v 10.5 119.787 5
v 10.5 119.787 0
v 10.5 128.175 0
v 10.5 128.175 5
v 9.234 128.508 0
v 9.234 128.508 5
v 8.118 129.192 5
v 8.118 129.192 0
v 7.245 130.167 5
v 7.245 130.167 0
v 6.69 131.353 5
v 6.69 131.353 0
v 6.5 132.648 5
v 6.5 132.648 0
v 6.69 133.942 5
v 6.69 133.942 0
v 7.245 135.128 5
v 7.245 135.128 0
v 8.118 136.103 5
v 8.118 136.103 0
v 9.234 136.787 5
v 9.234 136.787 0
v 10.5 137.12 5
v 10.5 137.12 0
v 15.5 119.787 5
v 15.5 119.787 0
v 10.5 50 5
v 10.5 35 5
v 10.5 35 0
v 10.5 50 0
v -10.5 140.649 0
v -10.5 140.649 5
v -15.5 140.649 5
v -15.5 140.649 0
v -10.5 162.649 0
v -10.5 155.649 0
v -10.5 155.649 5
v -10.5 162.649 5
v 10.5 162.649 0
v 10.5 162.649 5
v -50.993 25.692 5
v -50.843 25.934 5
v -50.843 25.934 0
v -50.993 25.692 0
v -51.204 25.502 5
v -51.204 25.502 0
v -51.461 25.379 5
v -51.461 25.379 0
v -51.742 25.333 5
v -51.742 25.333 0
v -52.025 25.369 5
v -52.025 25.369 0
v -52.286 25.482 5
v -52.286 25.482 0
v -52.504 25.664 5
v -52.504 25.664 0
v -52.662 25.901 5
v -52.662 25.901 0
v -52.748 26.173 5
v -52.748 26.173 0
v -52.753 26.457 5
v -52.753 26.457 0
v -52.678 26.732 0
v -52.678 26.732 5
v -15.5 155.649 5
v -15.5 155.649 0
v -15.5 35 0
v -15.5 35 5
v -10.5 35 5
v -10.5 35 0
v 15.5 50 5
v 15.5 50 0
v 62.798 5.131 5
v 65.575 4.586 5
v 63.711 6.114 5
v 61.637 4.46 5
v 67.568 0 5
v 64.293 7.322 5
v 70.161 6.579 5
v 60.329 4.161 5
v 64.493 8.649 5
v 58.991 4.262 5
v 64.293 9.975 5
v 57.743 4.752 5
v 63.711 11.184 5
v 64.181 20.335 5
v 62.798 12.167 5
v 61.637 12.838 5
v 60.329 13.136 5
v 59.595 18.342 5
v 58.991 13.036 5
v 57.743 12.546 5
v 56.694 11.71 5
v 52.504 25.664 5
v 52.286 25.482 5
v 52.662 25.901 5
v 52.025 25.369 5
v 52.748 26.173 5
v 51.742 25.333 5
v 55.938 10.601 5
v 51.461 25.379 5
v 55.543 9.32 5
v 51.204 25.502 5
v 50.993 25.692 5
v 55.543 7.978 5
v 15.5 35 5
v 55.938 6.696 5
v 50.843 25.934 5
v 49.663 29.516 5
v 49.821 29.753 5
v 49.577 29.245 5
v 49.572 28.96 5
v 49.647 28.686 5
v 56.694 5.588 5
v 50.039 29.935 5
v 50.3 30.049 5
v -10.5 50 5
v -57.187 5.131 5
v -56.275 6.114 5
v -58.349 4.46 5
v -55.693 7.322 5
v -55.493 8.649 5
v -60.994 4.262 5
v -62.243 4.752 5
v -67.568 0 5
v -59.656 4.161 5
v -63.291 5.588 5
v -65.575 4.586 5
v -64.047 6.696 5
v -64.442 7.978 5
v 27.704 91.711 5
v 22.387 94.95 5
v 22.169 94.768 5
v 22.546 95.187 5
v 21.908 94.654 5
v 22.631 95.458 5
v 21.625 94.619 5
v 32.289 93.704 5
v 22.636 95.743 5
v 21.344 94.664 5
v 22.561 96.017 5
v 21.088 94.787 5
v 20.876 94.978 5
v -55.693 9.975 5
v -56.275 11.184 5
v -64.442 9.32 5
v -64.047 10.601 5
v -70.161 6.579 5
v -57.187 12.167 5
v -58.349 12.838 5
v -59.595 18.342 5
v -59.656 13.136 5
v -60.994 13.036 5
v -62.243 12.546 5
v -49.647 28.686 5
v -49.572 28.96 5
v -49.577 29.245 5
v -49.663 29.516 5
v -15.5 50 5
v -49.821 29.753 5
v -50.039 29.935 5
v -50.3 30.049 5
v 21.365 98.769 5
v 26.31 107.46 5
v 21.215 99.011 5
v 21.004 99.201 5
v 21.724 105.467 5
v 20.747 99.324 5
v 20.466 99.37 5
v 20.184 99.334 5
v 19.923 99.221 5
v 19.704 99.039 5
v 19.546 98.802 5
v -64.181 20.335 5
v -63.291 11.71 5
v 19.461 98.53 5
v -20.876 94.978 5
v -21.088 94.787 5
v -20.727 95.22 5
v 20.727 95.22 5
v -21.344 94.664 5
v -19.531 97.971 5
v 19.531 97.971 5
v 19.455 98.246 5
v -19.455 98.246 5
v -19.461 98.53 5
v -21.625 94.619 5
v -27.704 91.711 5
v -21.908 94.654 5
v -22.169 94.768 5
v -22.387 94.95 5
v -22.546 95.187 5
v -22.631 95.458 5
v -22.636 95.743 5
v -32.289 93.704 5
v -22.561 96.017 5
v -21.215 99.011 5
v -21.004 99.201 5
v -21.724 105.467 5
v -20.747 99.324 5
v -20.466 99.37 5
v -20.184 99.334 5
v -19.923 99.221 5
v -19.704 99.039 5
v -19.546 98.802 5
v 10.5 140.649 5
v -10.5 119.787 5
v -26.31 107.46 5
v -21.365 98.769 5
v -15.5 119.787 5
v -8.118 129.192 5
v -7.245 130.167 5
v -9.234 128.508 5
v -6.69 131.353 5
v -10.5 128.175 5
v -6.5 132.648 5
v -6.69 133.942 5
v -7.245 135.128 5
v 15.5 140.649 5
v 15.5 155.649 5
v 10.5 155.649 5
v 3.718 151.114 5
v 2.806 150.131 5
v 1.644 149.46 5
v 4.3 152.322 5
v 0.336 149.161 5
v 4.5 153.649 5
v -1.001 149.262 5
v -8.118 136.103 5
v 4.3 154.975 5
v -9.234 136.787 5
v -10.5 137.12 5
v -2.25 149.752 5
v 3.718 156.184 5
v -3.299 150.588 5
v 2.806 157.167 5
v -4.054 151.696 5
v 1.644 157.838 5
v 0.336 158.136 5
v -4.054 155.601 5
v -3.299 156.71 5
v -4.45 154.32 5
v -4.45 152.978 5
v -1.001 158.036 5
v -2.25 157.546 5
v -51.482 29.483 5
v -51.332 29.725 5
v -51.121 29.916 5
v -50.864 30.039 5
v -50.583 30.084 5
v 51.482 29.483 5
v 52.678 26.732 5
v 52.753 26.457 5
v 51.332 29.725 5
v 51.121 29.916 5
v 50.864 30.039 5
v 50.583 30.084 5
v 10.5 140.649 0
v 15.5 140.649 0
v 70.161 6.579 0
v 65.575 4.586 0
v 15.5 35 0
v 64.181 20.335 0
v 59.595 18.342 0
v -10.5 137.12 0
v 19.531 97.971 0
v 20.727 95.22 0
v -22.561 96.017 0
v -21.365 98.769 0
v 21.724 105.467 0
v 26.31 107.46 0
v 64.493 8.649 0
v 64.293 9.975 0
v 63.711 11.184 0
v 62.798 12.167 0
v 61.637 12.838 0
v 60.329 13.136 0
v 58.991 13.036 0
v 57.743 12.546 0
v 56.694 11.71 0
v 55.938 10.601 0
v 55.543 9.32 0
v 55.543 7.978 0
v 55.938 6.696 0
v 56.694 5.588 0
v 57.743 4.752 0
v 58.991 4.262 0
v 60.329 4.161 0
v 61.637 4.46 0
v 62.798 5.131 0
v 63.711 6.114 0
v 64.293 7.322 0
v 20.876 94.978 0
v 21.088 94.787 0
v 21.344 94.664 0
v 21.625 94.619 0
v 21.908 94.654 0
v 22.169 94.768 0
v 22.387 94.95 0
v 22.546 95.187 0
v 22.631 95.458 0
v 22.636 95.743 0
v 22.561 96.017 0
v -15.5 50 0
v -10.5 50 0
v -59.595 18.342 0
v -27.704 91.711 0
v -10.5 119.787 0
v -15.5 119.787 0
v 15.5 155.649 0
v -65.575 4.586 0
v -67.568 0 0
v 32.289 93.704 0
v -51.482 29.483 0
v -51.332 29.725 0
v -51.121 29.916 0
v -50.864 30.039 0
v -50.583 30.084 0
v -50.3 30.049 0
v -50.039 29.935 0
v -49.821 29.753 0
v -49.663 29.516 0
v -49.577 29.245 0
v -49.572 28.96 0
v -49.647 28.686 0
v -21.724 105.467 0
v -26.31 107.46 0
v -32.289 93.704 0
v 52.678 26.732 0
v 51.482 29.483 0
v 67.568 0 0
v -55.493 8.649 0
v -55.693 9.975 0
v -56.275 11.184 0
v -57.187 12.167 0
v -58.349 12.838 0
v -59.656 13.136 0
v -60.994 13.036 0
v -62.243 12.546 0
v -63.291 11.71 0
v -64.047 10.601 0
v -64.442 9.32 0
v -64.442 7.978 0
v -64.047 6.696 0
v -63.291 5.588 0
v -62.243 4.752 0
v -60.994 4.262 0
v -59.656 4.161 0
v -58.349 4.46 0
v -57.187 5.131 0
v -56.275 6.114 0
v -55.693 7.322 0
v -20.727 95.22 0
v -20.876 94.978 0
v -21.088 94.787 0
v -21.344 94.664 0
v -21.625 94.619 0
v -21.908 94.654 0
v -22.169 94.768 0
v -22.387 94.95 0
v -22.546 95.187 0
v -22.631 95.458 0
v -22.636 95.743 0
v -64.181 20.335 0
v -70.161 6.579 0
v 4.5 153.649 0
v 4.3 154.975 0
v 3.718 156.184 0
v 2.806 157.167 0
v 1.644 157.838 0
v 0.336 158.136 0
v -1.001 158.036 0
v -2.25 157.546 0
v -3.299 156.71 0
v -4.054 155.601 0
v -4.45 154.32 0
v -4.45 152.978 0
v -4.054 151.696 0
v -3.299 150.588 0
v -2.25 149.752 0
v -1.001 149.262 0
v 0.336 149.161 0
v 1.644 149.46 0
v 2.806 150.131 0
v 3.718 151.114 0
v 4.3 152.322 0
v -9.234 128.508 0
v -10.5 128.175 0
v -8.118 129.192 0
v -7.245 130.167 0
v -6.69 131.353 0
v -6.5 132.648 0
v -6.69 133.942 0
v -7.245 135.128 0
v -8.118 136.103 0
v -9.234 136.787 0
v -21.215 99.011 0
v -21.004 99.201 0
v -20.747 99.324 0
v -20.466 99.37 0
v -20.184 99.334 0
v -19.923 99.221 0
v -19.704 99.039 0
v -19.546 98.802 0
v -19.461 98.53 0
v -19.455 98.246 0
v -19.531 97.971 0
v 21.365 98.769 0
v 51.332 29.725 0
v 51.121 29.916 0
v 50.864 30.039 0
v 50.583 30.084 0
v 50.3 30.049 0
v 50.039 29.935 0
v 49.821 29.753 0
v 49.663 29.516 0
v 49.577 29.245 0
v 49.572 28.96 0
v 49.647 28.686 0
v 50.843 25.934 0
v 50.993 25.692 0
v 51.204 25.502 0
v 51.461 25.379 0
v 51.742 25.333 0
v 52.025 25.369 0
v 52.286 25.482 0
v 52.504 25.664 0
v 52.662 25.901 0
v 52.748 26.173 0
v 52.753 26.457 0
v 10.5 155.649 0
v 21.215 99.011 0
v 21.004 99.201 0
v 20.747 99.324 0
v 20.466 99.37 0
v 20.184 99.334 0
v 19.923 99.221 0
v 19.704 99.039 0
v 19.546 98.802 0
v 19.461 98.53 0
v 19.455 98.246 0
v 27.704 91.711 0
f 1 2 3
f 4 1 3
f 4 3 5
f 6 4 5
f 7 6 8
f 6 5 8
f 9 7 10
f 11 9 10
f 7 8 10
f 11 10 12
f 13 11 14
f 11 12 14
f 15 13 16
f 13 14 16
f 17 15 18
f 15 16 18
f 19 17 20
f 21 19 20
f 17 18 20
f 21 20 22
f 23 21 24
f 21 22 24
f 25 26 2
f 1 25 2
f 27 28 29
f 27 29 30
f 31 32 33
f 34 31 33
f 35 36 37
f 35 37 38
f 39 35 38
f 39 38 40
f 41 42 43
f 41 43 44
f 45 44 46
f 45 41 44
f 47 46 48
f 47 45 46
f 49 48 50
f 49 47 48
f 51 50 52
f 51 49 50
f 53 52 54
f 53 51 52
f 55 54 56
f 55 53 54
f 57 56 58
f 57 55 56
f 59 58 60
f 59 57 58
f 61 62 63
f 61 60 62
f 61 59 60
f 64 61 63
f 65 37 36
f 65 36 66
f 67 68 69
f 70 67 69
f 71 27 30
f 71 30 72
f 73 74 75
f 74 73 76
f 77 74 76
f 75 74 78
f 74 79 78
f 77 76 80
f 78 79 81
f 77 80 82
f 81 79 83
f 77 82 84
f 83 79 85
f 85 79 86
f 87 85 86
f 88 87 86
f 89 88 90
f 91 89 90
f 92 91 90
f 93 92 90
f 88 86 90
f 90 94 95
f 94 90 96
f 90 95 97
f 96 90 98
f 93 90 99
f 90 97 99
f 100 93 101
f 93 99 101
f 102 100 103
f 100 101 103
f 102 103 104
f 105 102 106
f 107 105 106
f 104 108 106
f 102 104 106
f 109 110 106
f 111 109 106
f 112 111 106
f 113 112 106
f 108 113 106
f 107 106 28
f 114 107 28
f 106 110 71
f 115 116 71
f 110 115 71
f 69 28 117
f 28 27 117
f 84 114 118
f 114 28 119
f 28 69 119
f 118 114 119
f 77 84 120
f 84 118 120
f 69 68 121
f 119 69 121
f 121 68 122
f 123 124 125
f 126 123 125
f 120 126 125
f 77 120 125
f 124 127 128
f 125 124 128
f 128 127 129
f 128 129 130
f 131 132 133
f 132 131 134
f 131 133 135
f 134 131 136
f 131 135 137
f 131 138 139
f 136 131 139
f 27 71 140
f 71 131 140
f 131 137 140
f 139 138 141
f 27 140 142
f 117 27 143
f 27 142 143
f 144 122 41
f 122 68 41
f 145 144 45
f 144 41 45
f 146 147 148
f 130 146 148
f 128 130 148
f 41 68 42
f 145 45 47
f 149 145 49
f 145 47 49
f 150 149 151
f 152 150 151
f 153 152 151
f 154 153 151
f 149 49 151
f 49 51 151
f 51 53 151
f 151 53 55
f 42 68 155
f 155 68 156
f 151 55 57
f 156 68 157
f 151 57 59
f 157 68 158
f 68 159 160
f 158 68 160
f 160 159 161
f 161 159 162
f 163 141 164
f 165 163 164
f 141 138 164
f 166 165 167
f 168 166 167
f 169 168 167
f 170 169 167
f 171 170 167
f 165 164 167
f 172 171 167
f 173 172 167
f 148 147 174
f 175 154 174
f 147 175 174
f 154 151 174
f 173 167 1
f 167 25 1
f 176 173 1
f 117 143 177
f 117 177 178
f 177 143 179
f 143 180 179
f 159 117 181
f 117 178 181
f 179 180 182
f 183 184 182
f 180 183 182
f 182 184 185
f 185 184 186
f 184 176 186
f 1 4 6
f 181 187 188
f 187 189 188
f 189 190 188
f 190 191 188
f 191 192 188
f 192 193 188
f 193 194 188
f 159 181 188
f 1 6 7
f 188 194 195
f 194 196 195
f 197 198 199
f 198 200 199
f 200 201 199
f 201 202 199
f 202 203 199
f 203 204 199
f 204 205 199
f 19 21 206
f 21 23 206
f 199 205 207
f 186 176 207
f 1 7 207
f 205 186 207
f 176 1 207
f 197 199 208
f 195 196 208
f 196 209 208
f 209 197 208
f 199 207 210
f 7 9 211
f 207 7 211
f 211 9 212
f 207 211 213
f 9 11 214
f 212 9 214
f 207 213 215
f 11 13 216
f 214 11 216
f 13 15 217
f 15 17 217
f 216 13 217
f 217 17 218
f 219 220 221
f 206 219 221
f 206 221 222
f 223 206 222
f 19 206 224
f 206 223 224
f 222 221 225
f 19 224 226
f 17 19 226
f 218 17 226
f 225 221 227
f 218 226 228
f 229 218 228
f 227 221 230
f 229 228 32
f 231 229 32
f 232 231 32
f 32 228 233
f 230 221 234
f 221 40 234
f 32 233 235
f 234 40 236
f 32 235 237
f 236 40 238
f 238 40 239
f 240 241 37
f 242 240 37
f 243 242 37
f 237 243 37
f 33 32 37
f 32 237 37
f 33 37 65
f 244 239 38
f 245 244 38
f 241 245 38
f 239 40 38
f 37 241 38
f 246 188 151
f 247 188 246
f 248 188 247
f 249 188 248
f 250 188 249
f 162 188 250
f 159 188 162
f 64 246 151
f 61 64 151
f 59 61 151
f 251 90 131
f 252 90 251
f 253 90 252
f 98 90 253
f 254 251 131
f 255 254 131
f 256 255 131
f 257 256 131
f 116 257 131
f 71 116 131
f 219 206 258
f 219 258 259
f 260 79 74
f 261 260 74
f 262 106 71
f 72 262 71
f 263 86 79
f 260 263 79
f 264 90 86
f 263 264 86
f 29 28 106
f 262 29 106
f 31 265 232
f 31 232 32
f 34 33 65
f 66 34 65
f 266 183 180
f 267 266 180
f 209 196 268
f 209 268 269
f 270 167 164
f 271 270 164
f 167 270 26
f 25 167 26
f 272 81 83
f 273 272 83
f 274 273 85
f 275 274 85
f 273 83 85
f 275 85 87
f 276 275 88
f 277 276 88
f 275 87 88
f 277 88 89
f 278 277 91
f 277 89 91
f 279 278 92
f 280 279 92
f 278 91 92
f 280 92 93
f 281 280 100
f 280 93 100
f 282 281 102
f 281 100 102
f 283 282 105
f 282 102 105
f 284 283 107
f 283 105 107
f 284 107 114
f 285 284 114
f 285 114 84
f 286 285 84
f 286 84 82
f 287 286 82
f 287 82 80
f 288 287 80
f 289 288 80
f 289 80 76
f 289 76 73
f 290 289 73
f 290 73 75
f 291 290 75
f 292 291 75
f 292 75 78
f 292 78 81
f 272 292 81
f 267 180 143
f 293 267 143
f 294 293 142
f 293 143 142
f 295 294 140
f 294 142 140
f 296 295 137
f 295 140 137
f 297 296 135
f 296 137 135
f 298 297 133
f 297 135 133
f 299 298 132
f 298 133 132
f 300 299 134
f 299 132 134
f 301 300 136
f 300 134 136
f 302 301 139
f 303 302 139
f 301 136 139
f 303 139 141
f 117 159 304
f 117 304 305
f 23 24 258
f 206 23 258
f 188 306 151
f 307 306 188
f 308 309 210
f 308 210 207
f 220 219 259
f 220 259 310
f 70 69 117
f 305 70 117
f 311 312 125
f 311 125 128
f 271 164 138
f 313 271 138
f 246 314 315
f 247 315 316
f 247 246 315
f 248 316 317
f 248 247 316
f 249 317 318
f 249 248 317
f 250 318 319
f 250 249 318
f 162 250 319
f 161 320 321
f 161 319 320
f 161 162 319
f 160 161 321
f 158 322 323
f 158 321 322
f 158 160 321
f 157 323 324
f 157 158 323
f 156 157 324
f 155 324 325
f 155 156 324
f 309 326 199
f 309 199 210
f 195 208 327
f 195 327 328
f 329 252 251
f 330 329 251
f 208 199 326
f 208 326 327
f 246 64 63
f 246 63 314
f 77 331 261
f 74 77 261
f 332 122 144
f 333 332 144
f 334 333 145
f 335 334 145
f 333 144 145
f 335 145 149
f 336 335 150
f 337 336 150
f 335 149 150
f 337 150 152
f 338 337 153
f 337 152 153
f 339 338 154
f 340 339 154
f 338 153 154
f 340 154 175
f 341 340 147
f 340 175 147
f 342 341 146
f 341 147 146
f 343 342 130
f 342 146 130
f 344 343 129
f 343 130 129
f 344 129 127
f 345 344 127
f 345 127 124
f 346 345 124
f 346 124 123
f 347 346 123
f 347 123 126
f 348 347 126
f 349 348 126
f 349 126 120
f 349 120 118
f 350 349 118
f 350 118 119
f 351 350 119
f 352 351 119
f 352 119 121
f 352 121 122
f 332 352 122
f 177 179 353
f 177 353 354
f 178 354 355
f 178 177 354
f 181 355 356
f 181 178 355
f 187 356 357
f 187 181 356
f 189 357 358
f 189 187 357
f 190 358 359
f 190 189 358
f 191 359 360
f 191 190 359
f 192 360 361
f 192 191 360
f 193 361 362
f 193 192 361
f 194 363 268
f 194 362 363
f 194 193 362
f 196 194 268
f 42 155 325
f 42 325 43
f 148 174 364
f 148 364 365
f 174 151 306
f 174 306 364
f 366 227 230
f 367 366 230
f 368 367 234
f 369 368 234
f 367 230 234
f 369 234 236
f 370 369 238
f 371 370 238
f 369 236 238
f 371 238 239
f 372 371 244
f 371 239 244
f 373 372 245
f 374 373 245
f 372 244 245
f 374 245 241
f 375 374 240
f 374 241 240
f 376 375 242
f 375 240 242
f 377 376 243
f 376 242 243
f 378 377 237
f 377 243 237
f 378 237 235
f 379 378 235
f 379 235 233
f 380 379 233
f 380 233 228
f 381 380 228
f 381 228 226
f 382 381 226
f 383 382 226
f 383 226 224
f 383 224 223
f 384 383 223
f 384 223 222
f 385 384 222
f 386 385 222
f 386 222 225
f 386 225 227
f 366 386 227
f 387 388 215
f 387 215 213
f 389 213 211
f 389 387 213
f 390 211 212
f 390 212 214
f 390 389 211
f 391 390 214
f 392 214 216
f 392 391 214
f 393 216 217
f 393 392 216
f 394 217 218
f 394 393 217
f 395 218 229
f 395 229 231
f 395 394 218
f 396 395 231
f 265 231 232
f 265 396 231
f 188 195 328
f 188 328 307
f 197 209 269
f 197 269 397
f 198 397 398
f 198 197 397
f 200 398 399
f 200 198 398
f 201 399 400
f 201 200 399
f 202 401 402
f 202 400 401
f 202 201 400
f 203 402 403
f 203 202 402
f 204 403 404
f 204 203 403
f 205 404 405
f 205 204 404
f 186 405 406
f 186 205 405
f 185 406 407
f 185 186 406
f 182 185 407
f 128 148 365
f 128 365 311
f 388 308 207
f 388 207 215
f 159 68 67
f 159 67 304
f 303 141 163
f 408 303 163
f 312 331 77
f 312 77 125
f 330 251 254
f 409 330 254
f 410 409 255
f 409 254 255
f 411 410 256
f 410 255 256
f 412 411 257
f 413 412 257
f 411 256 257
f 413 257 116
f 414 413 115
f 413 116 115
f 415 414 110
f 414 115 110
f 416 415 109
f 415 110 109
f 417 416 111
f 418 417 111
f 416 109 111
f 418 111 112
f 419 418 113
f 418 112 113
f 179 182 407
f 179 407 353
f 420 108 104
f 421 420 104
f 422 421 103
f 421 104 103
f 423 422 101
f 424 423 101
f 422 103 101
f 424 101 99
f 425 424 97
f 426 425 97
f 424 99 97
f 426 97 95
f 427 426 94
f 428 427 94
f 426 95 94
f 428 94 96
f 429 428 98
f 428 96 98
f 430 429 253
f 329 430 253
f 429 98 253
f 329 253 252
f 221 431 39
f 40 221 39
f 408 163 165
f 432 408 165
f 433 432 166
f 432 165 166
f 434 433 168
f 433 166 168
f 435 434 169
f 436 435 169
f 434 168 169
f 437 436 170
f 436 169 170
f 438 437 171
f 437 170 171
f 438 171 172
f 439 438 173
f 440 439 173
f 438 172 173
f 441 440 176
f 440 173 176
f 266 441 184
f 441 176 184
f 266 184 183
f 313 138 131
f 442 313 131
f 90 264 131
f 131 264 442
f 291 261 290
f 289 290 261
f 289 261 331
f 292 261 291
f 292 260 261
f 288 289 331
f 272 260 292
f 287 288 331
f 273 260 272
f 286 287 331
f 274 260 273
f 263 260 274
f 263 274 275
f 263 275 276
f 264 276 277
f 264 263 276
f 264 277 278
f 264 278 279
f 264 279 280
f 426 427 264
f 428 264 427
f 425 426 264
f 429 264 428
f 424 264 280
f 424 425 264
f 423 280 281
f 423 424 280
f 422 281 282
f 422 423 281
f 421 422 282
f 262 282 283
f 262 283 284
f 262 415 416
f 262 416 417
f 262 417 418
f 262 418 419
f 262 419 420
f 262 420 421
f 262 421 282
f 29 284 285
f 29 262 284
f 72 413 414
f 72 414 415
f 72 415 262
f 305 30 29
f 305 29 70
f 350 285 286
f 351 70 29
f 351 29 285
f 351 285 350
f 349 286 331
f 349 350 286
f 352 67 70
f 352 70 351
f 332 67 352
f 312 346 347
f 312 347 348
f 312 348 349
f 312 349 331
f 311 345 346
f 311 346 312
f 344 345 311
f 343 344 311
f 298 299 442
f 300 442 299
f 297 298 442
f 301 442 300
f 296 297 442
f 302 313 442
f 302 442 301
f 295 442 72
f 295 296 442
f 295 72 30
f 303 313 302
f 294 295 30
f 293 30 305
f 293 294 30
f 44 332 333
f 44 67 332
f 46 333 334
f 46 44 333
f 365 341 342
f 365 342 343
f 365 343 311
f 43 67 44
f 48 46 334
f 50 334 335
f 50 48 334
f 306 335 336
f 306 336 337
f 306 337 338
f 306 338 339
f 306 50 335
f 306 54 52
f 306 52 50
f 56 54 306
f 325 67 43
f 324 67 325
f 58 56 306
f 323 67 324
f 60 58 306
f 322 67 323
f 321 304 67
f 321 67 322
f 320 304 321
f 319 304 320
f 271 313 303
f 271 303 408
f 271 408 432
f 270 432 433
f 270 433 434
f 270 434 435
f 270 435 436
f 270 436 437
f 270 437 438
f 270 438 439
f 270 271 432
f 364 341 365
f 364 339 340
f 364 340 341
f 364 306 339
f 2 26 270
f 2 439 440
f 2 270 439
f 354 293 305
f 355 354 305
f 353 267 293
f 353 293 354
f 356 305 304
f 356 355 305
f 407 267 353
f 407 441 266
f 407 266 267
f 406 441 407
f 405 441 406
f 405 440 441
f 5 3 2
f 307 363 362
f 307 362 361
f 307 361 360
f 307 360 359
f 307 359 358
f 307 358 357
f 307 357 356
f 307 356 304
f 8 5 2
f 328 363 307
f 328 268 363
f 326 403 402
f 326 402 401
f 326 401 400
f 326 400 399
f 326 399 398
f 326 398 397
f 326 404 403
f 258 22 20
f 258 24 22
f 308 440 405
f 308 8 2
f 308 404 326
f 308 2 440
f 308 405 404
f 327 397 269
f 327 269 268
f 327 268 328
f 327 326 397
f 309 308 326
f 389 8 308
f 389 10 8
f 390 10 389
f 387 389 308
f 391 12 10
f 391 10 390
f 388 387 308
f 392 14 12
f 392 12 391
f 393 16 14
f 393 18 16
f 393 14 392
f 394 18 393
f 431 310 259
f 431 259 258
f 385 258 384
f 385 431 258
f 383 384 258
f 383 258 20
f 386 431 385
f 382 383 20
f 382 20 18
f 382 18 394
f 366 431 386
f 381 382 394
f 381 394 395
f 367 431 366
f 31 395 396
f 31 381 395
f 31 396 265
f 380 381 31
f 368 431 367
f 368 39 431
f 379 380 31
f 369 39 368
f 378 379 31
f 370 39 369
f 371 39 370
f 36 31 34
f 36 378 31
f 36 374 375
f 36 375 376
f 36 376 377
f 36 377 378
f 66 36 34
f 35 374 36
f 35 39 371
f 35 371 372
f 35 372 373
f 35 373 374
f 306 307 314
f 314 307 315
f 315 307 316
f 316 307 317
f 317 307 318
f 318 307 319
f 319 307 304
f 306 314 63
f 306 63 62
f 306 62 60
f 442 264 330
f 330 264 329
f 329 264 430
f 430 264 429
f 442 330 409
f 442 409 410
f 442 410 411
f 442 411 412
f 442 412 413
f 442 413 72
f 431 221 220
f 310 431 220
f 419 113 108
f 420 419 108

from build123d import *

# Parameters (mm, degrees)
BOSS_EXTRUDE1_DEPTH = 5
SKETCH3_W           = 5
SKETCH3_H           = 15
BOSS_EXTRUDE2_DEPTH = 5
SKETCH4_R           = 4.5
CUT_EXTRUDE1_DEPTH  = 178.20653008
SKETCH5_W           = 5
SKETCH5_H           = 15
CUT_EXTRUDE2_DEPTH  = 178.20653008
CUT_EXTRUDE3_DEPTH  = 178.20653008


with BuildPart() as part:
    # Sketch1 → Boss-Extrude1 (new body)
    with BuildSketch(Plane.XY):
        with BuildLine():
            Line((0, 0), (67.568382456, 0))
            Line((67.568382456, 0), (15.5, 119.786515986))
            Line((15.5, 119.786515986), (10.5, 119.786515986))
            Line((10.5, 119.786515986), (10.5, 128.17540896))
            ThreePointArc((10.5, 128.17540896), (6.5, 132.647544915), (10.5, 137.11968087))
            Line((10.5, 137.11968087), (10.5, 162.648799484))
            Line((10.5, 162.648799484), (0, 162.648799484))
            Line((0, 162.648799484), (0, 0))
        make_face()
    boss_extrude1 = extrude(amount=BOSS_EXTRUDE1_DEPTH)

    # Sketch3 → Boss-Extrude2 (add)
    with BuildSketch(Plane.XY.offset(5)):
        Polygon((65.57516115, 4.585528195), (59.595497232, 18.34211278), (64.181025427, 20.335334085), (70.160689345, 6.578749501), align=None)
        Polygon((27.703956339, 91.710563898), (21.724292422, 105.467148482), (26.309820617, 107.460369788), (32.289484534, 93.703785203), align=None)
        with Locations((13, 148.148799484)):
            Rectangle(SKETCH3_W, SKETCH3_H)
    boss_extrude2 = extrude(amount=-BOSS_EXTRUDE2_DEPTH)

    # Mirror1: Boss-Extrude1, Boss-Extrude2 across plane
    add(boss_extrude1.mirror(Plane(origin=(0, 162.648799484, 5), x_dir=(0, 0, 1), z_dir=(1, 0, 0))))
    add(boss_extrude2.mirror(Plane(origin=(0, 162.648799484, 5), x_dir=(0, 0, 1), z_dir=(1, 0, 0))))

    # Sketch4 → Cut-Extrude1 (cut, through all)
    with BuildSketch(Plane.XY.offset(5)):
        with Locations((0, 153.648852717)):
            Circle(SKETCH4_R)
        with Locations((-59.99258678, 8.648878597)):
            Circle(SKETCH4_R)
        with Locations((59.99258678, 8.648878597)):
            Circle(SKETCH4_R)
    extrude(amount=-CUT_EXTRUDE1_DEPTH, mode=Mode.SUBTRACT)

    # Sketch5 → Cut-Extrude2 (cut, through all)
    with BuildSketch(Plane.XY.offset(5)):
        with Locations((13, 42.5)):
            Rectangle(SKETCH5_W, SKETCH5_H)
        with Locations((-13, 42.5)):
            Rectangle(SKETCH5_W, SKETCH5_H)
    extrude(amount=-CUT_EXTRUDE2_DEPTH, mode=Mode.SUBTRACT)

    # Sketch6 → Cut-Extrude3 (cut, through all)
    with BuildSketch(Plane.XY.offset(5)):
        with BuildLine():
            Line((-52.677576554, 26.731708191), (-51.481643771, 29.483025108))
            ThreePointArc((-51.481643771, 29.483025108), (-50.16589387, 30.001486486), (-49.647432493, 28.685736586))
            Line((-49.647432493, 28.685736586), (-50.843365276, 25.934419669))
            ThreePointArc((-50.843365276, 25.934419669), (-52.159115176, 25.415958291), (-52.677576554, 26.731708191))
        make_face()
        with BuildLine():
            Line((-22.560773856, 96.017264948), (-21.364841072, 98.768581865))
            ThreePointArc((-21.364841072, 98.768581865), (-20.049091172, 99.287043243), (-19.530629794, 97.971293343))
            Line((-19.530629794, 97.971293343), (-20.726562578, 95.219976426))
            ThreePointArc((-20.726562578, 95.219976426), (-22.042312478, 94.701515048), (-22.560773856, 96.017264948))
        make_face()
    cut_extrude3 = extrude(amount=-CUT_EXTRUDE3_DEPTH, mode=Mode.SUBTRACT)

    # Mirror2: Cut-Extrude3 across plane
    add(cut_extrude3.mirror(Plane(origin=(0, 0, 0), x_dir=(0, 0, 1), z_dir=(1, 0, 0))), mode=Mode.SUBTRACT)


solid = part.part
